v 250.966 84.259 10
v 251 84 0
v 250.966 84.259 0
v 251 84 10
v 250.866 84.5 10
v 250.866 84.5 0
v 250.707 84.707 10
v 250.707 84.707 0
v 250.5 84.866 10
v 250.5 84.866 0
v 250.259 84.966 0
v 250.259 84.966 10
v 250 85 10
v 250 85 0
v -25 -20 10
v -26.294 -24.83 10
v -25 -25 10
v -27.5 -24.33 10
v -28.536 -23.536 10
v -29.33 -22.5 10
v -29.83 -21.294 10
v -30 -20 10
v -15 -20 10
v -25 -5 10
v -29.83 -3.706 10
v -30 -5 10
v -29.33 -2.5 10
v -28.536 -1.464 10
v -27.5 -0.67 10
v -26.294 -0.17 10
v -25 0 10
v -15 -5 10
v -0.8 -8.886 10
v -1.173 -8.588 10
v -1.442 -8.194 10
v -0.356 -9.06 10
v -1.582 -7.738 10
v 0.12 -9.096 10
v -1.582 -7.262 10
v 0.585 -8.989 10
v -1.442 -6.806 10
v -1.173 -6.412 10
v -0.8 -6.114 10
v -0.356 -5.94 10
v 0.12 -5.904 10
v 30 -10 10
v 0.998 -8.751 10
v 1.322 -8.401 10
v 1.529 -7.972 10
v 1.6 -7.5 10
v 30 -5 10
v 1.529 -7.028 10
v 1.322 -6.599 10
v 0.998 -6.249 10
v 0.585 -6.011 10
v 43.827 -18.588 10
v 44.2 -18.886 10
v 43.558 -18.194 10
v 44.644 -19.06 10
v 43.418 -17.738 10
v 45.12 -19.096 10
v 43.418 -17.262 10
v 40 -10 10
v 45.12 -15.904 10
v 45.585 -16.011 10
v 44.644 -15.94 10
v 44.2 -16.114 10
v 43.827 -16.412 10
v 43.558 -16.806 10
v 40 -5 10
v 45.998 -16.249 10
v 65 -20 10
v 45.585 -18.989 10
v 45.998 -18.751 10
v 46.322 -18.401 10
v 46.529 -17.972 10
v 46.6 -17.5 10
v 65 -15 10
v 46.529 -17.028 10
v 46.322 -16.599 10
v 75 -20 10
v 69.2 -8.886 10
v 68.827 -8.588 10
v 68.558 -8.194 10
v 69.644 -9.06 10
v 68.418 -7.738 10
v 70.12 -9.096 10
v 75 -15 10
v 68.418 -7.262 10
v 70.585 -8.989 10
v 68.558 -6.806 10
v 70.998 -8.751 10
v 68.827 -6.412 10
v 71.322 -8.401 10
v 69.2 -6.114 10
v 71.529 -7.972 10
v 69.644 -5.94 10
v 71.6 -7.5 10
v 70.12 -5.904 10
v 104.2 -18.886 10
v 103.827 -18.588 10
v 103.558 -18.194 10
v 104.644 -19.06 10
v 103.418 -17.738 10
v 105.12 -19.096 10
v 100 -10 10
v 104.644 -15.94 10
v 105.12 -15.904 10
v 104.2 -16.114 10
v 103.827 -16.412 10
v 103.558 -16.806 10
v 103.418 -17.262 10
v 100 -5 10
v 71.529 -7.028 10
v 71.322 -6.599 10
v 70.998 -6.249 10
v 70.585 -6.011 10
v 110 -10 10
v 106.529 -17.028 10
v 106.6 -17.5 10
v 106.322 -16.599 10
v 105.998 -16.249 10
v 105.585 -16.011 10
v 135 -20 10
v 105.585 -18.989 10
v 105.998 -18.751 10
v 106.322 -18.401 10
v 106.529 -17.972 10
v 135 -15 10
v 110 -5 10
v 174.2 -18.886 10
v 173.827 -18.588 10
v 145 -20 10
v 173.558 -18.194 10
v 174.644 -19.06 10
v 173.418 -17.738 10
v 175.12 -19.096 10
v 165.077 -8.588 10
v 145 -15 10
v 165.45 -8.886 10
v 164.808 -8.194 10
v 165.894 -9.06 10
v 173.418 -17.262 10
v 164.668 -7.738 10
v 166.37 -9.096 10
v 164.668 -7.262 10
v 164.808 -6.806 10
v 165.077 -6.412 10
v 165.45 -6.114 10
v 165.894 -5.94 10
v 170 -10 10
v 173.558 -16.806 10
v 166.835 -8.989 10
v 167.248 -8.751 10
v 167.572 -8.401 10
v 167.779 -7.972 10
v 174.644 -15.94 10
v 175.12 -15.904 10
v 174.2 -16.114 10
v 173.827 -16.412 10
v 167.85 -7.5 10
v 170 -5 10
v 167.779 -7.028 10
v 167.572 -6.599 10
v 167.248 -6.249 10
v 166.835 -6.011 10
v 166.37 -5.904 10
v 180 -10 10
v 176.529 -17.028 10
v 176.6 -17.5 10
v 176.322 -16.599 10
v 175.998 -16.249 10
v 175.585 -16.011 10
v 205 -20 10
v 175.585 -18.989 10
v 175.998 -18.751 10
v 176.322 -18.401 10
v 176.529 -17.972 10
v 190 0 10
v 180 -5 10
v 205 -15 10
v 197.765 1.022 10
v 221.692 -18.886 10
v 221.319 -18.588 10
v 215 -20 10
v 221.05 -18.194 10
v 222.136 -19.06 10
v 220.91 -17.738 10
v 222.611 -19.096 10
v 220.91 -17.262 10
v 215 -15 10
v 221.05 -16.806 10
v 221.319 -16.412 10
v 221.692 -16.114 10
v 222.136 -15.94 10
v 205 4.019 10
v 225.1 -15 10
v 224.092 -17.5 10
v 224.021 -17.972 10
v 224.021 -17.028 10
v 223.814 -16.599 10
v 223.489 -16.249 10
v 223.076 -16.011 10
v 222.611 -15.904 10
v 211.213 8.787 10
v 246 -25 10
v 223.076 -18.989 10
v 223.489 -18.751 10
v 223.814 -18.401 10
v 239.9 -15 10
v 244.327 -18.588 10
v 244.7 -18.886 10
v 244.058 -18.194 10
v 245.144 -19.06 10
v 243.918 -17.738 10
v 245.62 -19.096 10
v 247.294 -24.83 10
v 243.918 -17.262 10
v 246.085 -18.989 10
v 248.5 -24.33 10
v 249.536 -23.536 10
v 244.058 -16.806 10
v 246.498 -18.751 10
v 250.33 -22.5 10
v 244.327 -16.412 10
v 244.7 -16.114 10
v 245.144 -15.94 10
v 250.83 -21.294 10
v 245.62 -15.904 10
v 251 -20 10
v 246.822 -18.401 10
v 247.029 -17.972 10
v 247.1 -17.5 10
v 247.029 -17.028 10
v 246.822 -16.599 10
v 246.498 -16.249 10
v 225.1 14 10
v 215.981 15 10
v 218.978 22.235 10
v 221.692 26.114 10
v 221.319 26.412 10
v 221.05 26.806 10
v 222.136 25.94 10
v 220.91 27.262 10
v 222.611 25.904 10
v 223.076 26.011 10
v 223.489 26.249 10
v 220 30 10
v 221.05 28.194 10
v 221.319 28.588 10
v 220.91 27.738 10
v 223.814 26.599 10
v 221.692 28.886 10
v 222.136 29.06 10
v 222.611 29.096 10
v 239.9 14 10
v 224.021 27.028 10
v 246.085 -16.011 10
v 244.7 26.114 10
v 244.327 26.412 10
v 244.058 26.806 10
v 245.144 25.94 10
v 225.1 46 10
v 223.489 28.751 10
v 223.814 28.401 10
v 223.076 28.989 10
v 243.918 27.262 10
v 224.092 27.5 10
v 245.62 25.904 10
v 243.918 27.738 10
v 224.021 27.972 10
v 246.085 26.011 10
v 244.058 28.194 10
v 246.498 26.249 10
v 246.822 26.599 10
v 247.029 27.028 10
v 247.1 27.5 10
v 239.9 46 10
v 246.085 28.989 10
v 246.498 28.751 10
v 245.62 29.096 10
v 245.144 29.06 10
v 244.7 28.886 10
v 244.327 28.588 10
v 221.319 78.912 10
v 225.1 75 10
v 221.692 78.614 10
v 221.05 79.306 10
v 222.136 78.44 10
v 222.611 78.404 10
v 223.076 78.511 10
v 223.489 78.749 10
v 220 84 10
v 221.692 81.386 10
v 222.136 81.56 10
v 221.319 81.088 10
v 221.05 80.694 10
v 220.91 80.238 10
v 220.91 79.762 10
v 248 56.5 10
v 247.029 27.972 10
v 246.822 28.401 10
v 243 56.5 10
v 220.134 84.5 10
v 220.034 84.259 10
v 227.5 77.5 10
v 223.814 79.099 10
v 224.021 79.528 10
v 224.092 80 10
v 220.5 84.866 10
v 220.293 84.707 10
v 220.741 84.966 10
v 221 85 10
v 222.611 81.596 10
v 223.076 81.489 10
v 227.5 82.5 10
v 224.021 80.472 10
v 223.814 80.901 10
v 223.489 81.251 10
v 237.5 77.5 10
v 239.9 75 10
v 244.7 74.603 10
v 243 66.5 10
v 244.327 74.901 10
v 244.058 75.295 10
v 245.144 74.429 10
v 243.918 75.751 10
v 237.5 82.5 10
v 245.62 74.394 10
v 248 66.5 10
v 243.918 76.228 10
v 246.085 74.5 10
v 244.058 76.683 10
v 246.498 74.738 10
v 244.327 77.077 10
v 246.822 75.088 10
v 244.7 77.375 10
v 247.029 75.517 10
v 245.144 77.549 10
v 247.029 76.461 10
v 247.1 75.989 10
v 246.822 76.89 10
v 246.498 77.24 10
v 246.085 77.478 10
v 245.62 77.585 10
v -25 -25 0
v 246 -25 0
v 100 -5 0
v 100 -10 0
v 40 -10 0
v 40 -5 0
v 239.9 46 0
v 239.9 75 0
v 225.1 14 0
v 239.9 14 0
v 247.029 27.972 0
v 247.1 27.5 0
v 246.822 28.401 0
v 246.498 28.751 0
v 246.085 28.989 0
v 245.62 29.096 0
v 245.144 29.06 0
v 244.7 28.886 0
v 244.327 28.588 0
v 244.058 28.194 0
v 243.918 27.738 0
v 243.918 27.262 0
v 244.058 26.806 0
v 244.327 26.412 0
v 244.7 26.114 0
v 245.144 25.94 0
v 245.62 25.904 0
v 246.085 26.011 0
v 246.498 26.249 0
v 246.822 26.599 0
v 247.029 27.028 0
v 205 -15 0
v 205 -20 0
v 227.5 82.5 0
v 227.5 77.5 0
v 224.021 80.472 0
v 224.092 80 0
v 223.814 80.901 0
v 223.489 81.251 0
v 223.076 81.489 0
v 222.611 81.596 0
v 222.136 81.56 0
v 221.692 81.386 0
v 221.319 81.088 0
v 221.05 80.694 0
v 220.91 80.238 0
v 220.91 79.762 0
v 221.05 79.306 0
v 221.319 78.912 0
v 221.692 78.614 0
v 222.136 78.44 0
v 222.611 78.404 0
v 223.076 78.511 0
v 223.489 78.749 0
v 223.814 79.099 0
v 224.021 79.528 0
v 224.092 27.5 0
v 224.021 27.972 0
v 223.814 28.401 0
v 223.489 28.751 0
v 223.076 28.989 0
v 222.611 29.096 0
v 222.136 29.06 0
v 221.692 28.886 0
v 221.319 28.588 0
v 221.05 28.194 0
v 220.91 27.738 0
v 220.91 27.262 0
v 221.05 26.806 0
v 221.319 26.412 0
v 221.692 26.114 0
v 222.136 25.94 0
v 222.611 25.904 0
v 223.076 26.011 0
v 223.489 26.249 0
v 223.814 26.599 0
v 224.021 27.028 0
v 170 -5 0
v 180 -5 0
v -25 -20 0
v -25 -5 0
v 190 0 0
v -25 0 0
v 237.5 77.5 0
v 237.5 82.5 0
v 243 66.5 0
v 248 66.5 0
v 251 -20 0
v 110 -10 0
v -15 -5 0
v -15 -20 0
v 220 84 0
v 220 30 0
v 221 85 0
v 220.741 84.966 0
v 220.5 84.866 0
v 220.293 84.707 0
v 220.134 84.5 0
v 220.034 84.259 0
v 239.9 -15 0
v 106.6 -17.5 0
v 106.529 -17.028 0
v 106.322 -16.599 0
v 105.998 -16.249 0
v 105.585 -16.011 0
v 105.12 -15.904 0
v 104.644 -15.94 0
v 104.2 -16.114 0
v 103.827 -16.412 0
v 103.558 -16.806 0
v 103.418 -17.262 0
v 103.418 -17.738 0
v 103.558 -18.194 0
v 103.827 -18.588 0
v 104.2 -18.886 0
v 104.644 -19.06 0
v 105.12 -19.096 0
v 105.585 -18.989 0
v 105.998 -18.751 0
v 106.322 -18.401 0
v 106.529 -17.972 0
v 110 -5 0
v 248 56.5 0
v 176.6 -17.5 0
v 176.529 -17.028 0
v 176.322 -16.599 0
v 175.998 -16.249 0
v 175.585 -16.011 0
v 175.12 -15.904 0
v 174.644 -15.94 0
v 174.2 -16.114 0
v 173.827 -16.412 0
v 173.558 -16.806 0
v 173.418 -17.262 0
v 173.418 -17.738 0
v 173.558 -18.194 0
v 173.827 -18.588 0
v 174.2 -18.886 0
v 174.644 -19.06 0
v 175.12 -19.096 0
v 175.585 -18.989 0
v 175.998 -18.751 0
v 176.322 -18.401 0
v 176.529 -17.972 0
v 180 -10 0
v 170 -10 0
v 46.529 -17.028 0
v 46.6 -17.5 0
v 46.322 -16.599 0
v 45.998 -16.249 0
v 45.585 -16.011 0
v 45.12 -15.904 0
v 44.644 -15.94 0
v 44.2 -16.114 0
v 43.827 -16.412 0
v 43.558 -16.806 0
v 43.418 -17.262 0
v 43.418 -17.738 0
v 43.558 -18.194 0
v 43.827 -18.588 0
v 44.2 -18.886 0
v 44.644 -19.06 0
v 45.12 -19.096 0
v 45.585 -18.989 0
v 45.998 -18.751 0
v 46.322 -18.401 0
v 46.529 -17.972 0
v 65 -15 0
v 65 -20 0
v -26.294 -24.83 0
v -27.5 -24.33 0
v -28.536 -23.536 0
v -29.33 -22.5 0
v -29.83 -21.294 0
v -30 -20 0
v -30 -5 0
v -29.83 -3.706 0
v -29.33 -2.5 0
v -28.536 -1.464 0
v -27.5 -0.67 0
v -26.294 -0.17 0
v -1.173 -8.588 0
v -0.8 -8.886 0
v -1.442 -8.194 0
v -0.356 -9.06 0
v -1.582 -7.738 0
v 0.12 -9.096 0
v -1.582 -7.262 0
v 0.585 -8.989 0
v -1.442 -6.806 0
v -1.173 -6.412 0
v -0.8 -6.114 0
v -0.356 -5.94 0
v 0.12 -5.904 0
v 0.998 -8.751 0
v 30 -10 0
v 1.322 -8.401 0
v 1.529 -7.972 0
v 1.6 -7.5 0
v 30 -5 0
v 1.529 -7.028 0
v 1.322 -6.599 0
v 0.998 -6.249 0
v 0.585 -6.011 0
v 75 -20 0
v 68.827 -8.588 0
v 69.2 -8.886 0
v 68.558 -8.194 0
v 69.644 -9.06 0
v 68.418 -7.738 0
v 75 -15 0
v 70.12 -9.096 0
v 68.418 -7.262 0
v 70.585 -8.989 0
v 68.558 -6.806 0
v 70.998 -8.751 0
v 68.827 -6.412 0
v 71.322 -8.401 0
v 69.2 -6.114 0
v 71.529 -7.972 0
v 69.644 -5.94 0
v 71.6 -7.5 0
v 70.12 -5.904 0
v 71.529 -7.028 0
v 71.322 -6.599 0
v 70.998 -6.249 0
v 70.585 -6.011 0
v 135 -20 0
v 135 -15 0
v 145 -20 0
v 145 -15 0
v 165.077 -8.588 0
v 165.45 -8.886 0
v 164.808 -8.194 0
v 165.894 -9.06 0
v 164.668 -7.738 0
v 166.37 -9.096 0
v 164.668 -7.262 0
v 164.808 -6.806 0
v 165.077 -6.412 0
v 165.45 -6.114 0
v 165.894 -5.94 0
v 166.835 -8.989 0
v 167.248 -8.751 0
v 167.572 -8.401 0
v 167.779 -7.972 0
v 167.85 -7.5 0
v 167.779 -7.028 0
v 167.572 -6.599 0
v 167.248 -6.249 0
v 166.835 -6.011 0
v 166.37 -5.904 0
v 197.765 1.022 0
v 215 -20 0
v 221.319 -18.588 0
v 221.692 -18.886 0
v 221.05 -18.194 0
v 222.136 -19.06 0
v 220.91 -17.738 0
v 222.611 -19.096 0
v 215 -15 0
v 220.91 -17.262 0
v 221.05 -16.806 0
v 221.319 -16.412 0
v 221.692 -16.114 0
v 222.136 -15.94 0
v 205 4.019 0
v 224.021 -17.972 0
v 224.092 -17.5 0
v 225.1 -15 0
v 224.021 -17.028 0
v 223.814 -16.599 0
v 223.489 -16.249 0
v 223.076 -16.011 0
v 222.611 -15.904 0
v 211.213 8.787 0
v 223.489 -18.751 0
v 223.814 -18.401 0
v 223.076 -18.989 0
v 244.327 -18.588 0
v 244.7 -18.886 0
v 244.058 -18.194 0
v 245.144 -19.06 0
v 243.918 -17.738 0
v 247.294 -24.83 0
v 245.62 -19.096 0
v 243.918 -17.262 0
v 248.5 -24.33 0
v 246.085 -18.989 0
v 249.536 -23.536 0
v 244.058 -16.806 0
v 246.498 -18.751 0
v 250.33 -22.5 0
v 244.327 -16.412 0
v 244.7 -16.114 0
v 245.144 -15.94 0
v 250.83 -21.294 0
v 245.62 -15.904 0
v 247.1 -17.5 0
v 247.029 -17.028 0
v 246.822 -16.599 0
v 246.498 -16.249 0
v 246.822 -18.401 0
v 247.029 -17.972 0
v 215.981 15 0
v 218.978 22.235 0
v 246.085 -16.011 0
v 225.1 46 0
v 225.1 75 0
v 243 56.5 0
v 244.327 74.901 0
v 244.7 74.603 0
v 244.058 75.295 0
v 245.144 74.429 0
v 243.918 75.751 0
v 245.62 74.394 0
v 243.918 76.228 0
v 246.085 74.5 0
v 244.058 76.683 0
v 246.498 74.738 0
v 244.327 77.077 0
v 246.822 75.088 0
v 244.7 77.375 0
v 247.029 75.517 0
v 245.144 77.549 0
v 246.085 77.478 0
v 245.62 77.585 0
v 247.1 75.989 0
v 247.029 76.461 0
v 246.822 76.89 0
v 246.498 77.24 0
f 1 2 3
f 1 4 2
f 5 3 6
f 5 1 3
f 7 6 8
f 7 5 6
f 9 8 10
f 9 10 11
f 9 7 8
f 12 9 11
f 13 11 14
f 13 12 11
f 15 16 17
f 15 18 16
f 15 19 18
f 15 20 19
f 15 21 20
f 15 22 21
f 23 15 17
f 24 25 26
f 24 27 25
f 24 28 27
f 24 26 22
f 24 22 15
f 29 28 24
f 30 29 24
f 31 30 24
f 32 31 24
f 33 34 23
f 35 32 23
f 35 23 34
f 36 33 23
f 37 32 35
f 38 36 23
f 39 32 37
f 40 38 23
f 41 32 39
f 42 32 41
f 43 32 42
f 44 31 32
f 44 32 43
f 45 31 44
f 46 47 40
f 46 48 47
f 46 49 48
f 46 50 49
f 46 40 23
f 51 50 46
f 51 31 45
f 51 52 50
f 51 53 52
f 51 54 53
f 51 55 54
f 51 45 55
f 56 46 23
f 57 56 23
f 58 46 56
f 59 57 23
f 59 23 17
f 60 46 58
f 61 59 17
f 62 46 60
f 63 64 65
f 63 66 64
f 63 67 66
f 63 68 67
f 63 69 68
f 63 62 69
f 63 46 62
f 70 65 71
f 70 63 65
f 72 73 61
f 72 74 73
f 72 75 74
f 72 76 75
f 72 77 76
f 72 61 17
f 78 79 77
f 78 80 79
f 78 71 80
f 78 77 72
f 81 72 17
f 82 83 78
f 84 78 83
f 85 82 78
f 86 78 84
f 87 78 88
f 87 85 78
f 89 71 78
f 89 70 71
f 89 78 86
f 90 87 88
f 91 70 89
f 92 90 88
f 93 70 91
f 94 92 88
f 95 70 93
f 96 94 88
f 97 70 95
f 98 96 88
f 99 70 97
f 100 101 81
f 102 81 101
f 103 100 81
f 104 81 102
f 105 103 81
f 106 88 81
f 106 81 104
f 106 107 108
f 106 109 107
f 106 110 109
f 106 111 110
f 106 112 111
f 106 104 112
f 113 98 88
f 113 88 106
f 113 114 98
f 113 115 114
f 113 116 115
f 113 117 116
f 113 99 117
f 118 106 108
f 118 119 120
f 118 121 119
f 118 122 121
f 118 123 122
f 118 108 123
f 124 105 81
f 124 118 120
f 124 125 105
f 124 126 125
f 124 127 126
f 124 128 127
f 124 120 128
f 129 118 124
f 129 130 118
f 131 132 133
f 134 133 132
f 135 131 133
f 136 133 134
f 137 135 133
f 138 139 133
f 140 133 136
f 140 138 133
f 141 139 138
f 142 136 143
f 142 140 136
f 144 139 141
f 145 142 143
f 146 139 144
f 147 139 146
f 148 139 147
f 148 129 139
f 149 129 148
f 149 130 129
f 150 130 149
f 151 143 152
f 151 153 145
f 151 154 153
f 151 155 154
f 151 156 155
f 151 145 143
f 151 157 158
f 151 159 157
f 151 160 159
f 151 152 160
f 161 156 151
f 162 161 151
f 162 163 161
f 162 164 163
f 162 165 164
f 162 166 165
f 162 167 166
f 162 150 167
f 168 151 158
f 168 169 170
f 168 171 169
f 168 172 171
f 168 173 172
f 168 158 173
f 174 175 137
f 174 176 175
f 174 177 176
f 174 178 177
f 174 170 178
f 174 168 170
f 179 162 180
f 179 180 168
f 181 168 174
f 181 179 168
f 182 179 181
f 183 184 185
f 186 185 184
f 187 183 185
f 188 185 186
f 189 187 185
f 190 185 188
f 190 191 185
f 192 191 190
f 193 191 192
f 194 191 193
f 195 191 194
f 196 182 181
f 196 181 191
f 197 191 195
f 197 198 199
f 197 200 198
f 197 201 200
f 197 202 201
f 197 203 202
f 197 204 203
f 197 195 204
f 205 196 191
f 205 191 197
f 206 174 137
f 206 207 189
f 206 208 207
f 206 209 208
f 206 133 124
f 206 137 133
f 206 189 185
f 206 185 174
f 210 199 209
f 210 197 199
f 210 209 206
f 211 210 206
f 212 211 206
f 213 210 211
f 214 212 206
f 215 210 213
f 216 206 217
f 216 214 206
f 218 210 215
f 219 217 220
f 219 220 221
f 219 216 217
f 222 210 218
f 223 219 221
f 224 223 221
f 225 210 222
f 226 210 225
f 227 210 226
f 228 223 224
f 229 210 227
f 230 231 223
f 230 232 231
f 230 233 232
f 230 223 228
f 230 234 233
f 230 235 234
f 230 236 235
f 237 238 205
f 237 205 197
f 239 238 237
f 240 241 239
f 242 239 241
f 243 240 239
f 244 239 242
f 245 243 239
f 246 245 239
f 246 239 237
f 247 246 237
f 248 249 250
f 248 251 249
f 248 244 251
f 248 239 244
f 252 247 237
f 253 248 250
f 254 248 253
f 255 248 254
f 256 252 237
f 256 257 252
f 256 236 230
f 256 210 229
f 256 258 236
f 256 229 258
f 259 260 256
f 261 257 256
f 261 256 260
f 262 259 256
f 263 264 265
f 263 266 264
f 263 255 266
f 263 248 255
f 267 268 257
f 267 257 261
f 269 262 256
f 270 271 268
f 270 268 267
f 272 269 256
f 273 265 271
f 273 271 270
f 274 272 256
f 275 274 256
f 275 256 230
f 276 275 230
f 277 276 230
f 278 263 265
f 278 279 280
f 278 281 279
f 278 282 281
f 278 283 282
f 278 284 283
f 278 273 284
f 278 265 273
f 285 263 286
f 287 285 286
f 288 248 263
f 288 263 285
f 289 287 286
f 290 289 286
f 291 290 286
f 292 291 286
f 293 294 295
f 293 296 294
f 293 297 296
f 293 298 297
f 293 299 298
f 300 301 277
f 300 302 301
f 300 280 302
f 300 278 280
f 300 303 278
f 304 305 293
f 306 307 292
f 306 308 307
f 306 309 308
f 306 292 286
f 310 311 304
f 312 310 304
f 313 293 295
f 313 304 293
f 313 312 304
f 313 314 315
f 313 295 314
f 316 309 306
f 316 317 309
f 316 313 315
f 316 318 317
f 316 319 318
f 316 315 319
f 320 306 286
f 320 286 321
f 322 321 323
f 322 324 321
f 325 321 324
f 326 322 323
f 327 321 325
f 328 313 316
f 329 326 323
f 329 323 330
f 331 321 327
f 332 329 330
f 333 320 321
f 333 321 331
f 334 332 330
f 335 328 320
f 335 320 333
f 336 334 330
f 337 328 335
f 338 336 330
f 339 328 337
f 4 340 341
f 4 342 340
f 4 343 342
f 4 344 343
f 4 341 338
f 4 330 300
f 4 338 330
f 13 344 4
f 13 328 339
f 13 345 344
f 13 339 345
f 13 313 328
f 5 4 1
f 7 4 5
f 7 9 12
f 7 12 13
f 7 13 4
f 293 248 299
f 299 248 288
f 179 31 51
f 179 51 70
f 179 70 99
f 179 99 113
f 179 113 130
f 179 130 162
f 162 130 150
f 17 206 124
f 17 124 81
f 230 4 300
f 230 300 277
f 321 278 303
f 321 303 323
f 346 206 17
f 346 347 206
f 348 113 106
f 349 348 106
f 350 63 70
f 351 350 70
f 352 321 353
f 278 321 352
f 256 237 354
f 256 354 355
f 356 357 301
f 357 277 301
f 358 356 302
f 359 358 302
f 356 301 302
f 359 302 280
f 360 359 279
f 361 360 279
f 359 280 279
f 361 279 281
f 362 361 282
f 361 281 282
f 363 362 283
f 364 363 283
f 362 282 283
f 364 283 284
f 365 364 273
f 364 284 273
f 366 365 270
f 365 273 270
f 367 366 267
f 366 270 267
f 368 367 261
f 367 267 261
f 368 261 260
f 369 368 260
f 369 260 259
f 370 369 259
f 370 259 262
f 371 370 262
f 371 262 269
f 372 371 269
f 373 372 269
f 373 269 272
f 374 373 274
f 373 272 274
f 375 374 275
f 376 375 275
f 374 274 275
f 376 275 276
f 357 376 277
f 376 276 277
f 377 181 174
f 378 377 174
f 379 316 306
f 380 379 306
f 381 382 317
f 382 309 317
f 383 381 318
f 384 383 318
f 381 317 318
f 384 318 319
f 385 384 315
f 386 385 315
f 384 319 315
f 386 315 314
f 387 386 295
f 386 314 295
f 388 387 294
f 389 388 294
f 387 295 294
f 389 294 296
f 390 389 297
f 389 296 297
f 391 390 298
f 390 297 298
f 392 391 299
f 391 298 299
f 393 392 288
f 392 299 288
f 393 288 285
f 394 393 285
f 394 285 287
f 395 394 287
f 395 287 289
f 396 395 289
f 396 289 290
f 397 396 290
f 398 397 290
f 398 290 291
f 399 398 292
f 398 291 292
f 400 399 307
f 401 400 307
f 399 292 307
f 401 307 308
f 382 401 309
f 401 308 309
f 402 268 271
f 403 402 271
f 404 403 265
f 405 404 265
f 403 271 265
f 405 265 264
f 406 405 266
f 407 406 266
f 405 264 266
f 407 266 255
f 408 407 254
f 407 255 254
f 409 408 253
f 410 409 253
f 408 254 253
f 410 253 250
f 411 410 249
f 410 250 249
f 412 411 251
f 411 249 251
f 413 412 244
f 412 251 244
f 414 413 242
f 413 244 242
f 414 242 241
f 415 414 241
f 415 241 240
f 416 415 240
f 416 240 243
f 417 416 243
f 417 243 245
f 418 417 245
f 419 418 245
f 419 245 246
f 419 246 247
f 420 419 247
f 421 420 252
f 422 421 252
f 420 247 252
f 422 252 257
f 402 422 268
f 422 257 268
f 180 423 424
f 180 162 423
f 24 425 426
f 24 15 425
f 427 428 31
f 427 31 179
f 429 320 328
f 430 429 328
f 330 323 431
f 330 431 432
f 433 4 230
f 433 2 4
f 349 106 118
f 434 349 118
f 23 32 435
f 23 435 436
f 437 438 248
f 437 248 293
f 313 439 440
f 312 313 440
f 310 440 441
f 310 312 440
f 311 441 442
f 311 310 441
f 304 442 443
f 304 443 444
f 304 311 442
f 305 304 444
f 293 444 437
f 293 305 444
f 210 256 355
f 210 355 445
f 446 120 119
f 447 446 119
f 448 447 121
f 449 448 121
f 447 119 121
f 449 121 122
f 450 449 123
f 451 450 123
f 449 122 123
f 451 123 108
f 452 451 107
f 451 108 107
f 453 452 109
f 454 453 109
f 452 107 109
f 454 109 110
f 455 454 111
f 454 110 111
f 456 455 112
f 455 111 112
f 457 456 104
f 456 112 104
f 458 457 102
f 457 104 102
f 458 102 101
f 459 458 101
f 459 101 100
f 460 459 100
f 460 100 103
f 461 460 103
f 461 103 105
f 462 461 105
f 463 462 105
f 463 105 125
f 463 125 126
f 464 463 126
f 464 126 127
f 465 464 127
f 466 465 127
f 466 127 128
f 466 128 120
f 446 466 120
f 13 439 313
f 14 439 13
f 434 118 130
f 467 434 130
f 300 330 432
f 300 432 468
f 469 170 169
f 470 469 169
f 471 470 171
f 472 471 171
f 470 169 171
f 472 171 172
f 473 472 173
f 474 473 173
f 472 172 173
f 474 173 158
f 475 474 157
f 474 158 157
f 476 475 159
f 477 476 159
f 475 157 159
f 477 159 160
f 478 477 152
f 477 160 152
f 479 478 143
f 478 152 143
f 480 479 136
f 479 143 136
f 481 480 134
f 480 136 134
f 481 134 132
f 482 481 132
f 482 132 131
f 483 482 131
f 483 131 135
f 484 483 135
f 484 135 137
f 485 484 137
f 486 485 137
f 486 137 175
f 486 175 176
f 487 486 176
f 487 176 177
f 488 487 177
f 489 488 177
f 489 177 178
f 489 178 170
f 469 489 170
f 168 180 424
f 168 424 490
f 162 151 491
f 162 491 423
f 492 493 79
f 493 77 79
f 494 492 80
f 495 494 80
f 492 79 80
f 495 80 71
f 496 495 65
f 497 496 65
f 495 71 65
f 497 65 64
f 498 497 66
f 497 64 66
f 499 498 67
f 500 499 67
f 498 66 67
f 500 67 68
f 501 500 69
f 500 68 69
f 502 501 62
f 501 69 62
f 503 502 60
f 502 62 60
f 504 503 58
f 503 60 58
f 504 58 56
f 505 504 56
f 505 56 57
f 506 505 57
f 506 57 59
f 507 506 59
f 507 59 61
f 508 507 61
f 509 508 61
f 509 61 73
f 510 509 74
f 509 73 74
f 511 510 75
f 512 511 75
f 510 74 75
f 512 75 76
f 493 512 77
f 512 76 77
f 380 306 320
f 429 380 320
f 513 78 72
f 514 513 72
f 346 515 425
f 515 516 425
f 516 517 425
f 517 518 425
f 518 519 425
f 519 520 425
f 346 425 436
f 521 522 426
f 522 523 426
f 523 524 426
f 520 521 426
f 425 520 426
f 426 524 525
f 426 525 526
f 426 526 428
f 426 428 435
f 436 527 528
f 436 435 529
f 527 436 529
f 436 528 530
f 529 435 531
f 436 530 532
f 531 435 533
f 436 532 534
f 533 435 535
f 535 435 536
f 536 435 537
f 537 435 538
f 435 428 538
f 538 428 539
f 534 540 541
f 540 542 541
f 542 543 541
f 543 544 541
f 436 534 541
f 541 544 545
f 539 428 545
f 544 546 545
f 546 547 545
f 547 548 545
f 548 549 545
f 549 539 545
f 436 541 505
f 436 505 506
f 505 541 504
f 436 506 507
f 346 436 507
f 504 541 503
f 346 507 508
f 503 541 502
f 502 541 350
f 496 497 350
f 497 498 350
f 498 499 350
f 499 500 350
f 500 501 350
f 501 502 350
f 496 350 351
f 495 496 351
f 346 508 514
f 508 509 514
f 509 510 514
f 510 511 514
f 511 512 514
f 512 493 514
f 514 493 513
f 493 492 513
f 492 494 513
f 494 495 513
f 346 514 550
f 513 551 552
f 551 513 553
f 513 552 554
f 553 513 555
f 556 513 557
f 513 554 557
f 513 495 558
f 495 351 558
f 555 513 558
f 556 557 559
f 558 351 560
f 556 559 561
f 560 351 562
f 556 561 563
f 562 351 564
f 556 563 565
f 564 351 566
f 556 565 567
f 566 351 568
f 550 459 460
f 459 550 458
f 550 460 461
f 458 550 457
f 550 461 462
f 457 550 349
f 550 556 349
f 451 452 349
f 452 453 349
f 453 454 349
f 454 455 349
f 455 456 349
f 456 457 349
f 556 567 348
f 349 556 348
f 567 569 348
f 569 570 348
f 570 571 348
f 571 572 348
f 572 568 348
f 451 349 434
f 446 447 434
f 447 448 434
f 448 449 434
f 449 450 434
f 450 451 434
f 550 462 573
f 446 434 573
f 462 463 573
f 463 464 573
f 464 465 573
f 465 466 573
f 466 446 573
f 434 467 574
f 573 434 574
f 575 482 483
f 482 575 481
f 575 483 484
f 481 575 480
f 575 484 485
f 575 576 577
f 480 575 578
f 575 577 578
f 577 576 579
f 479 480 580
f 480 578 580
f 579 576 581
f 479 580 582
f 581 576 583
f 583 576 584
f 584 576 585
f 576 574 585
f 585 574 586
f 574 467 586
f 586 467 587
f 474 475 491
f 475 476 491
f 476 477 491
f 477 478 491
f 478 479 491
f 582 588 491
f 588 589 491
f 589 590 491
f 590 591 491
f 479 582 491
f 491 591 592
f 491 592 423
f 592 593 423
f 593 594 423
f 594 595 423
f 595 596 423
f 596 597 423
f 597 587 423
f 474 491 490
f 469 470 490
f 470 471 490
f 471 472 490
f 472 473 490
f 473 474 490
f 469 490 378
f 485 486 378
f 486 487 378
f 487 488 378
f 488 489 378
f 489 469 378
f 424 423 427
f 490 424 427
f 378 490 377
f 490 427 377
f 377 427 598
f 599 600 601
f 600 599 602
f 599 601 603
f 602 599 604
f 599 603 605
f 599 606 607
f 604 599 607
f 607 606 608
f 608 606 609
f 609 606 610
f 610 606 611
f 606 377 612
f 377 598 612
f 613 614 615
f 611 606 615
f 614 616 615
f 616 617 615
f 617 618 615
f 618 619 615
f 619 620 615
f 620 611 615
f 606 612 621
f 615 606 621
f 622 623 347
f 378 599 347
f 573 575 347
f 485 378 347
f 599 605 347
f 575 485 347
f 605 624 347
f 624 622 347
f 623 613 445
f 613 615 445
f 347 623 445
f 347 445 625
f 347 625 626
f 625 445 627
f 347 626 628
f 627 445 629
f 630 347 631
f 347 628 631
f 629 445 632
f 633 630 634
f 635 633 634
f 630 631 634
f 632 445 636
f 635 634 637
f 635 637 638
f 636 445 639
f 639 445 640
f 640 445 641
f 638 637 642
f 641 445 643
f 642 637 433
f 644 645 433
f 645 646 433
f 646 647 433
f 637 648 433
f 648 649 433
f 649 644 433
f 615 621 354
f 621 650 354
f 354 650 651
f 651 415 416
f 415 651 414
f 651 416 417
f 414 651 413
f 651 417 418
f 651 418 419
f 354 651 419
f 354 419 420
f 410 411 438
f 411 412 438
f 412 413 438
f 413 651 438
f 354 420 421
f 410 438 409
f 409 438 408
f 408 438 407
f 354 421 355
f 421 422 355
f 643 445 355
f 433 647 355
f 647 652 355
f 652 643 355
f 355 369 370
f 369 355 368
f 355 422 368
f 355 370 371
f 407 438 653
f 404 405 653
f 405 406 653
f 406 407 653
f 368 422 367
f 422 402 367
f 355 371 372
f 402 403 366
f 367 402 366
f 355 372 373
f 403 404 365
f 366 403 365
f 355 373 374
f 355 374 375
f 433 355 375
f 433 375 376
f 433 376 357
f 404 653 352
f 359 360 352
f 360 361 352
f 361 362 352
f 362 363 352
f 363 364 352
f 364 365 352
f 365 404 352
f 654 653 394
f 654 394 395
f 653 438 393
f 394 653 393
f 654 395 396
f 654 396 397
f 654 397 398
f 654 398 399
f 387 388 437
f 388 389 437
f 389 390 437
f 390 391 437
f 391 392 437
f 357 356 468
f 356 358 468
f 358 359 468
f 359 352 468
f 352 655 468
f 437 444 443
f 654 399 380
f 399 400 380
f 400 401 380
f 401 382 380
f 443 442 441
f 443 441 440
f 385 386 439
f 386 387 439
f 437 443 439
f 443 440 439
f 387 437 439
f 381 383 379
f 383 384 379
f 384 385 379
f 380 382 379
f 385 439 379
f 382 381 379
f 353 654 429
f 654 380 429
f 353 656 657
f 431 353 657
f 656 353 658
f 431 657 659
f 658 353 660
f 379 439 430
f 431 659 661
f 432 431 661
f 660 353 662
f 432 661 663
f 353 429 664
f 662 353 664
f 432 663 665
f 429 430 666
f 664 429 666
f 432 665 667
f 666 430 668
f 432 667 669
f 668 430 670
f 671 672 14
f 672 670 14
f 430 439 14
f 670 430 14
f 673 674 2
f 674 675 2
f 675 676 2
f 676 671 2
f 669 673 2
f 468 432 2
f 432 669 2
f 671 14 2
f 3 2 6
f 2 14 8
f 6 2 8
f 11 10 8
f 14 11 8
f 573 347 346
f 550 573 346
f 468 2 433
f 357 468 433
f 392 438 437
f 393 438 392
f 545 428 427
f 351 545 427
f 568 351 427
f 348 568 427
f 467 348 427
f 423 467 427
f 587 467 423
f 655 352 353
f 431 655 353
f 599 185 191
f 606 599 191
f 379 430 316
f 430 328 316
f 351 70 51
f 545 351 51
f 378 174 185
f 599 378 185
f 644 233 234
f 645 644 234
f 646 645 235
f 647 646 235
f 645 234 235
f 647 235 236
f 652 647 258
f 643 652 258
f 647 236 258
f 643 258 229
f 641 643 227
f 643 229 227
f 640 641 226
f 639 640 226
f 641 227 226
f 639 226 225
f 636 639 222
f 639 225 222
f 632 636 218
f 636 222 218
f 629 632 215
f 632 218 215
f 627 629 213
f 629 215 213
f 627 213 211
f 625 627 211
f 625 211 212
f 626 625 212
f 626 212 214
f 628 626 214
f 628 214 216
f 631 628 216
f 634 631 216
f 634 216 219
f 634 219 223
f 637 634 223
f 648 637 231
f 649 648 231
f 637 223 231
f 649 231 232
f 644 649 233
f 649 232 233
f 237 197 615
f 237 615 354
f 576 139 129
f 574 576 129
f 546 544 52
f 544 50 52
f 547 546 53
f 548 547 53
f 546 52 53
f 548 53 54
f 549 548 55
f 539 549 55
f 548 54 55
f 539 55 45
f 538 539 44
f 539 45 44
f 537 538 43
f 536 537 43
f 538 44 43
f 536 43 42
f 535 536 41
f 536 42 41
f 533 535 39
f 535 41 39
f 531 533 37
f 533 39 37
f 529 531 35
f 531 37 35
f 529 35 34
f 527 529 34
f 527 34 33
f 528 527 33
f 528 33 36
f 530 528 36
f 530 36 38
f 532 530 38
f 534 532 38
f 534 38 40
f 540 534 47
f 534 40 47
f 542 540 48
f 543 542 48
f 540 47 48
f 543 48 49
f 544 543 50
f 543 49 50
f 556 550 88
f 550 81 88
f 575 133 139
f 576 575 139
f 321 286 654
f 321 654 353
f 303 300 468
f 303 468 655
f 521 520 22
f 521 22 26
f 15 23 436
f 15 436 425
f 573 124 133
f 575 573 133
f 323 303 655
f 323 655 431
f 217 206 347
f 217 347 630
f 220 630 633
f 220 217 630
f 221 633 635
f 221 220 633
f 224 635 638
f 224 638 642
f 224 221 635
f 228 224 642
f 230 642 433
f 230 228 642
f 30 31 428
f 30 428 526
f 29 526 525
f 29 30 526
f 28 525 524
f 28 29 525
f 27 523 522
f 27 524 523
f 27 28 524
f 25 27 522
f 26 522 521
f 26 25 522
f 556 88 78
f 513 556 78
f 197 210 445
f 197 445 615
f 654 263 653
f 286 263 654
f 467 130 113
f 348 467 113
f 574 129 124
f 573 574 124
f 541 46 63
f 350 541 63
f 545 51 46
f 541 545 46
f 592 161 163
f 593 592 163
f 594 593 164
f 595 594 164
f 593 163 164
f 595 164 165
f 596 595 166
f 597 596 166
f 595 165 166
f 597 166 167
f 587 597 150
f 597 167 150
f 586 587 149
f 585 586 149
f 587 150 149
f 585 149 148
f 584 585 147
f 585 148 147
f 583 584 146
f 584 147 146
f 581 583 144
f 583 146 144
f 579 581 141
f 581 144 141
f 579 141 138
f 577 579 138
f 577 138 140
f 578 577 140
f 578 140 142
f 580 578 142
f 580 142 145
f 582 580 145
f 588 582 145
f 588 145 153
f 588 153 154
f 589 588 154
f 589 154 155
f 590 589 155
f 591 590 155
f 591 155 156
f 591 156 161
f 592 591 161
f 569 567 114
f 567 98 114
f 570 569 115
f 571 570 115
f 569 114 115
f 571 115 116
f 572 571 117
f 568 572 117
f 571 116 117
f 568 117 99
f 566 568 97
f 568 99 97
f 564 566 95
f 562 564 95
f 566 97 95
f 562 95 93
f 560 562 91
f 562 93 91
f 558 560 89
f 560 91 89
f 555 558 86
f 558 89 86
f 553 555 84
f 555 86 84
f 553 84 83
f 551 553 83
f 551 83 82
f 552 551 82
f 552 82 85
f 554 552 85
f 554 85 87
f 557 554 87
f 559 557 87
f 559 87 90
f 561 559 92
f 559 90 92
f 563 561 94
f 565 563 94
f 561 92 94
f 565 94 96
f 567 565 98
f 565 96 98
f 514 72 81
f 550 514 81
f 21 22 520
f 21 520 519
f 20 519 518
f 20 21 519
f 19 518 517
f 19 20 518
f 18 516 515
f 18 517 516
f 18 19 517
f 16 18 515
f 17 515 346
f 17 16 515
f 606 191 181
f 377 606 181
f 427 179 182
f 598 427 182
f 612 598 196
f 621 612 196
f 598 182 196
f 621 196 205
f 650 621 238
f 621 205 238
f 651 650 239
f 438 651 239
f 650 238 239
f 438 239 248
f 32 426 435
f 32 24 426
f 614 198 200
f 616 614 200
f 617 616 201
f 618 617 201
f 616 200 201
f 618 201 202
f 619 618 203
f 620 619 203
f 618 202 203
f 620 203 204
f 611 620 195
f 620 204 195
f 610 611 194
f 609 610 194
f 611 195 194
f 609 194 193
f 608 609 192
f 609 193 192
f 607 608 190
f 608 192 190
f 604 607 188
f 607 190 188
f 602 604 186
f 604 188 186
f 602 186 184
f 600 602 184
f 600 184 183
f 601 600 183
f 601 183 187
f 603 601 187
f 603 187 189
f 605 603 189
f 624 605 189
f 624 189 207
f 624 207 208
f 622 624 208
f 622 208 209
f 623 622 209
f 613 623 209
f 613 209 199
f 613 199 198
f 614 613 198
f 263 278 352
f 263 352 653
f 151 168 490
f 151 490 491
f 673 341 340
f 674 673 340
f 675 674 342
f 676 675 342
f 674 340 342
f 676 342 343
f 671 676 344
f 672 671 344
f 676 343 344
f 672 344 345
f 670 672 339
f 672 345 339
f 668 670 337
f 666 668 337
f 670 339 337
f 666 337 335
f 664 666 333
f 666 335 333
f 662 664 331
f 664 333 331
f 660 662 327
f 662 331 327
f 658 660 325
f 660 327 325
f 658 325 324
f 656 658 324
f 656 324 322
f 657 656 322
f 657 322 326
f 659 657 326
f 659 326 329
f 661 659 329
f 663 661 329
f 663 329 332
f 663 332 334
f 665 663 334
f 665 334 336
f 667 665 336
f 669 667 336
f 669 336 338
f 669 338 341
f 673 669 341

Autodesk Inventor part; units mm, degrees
ref_plane "YZ Plane" through (0, 0, 0) normal (1, 0, 0) x (0, 1, 0)
ref_plane "XZ Plane" through (0, 0, 0) normal (0, 1, 0) x (-1, 0, 0)
ref_plane "XY Plane" through (0, 0, 0) normal (0, 0, 1) x (1, 0, 0)
sketch "Boceto1" plane through (0, 0, 0) normal (0, 0, 1) x (1, 0, 0)
  line L0 (0, 0) -> (220, 0)
  line L1 (251, 0) -> (251, -25)
  line L2 (251, -25) -> (0, -25)
  line L3 (220, 0) -> (220, 85)
  line L4 (220, 85) -> (251, 85)
  line L5 (251, 85) -> (251, 0)
  line L6 (0, -25) -> (-30, -25)
  line L7 (-30, -25) -> (-30, 0)
  line L8 (-30, 0) -> (0, 0)
  dimension "d3" = 85
  dimension "d4" = 31
extrude "Extrusión1" add sketch "Boceto1" along normal blind 10
fillet "Empalme1" radius 30 1 edges at (220, 0, 5)
sketch "Boceto2" plane through (0, 0, 10) normal (0, 0, 1) x (1, 0, 0)
  line L0 (220, 30) -> (220, 85) projected
  line L1 (251, -25) -> (-30, -25) projected
  line L2 (220, 85) -> (251, 85) projected
  line L3 (225.1, 75) -> (239.9, 75)
  line L4 (239.9, 75) -> (239.9, 46)
  line L5 (239.9, 46) -> (225.1, 46)
  line L6 (225.1, 46) -> (225.1, 75)
  line L7 (225.1, 14) -> (239.9, 14)
  line L8 (239.9, 14) -> (239.9, -15)
  line L9 (239.9, -15) -> (225.1, -15)
  line L10 (225.1, -15) -> (225.1, 14)
  point P0 (225, 80)
  point P1 (220, 75)
  point P2 (5, -25)
  point P3 (240, -25)
  point P4 (245, -20)
  point P5 (245, 75)
  point P6 (240, 80)
  point P7 (0, 0)
  point P8 (0, -25)
  dimension "d10" = 14.8
  dimension "d11" = 14.8
  dimension "d12" = 5.1
  dimension "d14" = 10
  dimension "d15" = 29
  dimension "d16" = 29
  dimension "d17" = 10
  dimension "d82" = 5.1
extrude "Extrusión2" cut sketch "Boceto2" against normal blind 10
sketch "Boceto3" plane through (0, 0, 10) normal (0, 0, 1) x (1, 0, 0)
  line L0 (0, 0) -> (190, 0) projected
  line L1 (251, -25) -> (-30, -25) projected
  line L2 (180, -10) -> (170, -10)
  line L3 (170, -10) -> (170, -5)
  line L4 (170, -5) -> (180, -5)
  line L5 (180, -5) -> (180, -10)
  line L6 (110, -5) -> (100, -5)
  line L7 (100, -5) -> (100, -10)
  line L8 (100, -10) -> (110, -10)
  line L9 (110, -10) -> (110, -5)
  line L10 (40, -5) -> (30, -5)
  line L11 (30, -5) -> (30, -10)
  line L12 (30, -10) -> (40, -10)
  line L13 (40, -10) -> (40, -5)
  line L14 (145, -15) -> (135, -15)
  line L15 (135, -15) -> (135, -20)
  line L16 (135, -20) -> (145, -20)
  line L17 (145, -20) -> (145, -15)
  line L18 (75, -15) -> (65, -15)
  line L19 (65, -15) -> (65, -20)
  line L20 (65, -20) -> (75, -20)
  line L21 (75, -20) -> (75, -15)
  point P0 (5, 0)
  point P1 (0, -5)
  point P2 (0, -20)
  point P3 (5, -25)
  point P4 (240, -25)
  dimension "d20" = 10
  dimension "d21" = 10
  dimension "d22" = 10
  dimension "d24" = 5
  dimension "d25" = 5
  dimension "d26" = 5
  dimension "d27" = 5
  dimension "d28" = 5
  dimension "d29" = 10
  dimension "d30" = 10
  dimension "d31" = 5
  dimension "d32" = 5
  dimension "d33" = 5
  dimension "d34" = 5
  dimension "d36" = 25
  dimension "d37" = 25
  dimension "d38" = 25
  dimension "d39" = 25
extrude "Extrusión3" cut sketch "Boceto3" against normal blind 10
sketch "Boceto4" plane through (0, 0, 10) normal (0, 0, 1) x (1, 0, 0)
  line L0 (145, -15) -> (145, -20) projected
  line L1 (145, -20) -> (135, -20) projected
  line L2 (205, -20) -> (215, -20)
  line L3 (215, -20) -> (215, -15)
  line L4 (215, -15) -> (205, -15)
  line L5 (205, -15) -> (205, -20)
  point P0 (0, 0)
  dimension "d42" = 10
  dimension "d43" = 5
  dimension "d44" = 60
extrude "Extrusión4" cut sketch "Boceto4" against normal blind 10
sketch "Boceto6" plane through (0, 0, 10) normal (0, 0, 1) x (1, 0, 0)
  line L0 (237.5, 82.5) -> (227.5, 82.5)
  line L1 (227.5, 82.5) -> (227.5, 77.5)
  line L2 (227.5, 77.5) -> (237.5, 77.5)
  line L3 (237.5, 77.5) -> (237.5, 82.5)
  circle A0 centre (245.5, -17.5) radius 1.6
  circle A1 centre (245.5, 27.5) radius 1.6
  circle A2 centre (245.5, 75.9891) radius 1.6
  circle A3 centre (222.4918, 80) radius 1.6
  circle A4 centre (222.4918, 27.5) radius 1.6
  circle A5 centre (175, -17.5) radius 1.6
  circle A6 centre (166.25, -7.5) radius 1.6
  circle A7 centre (105, -17.5) radius 1.6
  circle A8 centre (70, -7.5) radius 1.6
  circle A9 centre (45, -17.5) radius 1.6
  circle A10 centre (0, -7.5) radius 1.6
  line L4 (-30, -25) -> (-30, 0) projected
  circle A11 centre (222.4918, -17.5) radius 1.6
  line L5 (251, 85) -> (251, -25) projected
  line L6 (220, 85) -> (251, 85) projected
  line L7 (170, -10) -> (170, -5) projected
  point P0 (0, 0)
  dimension "d52" = 5
  dimension "d54" = 3.2
  dimension "d55" = 3.2
  dimension "d56" = 3.2
  dimension "d57" = 3.2
  dimension "d58" = 3.2
  dimension "d60" = 3.2
  dimension "d61" = 3.2
  dimension "d62" = 3.2
  dimension "d63" = 3.2
  dimension "d64" = 3.2
  dimension "d65" = 3.2
  dimension "d80" = 30
  dimension "d81" = 3.2
  dimension "d83" = 5.5
  dimension "d84" = 5.5
  dimension "d85" = 5.5
  dimension "d92" = 2.5
  dimension "d93" = 5
  dimension "d94" = 3.75
  dimension "d95" = 75
extrude "Extrusión6" cut sketch "Boceto6" against normal blind 10
fillet "Empalme3" radius 5 1 edges at (251, -25, 5)
fillet "Empalme4" radius 5 2 edges at (-30, 0, 5) (-30, -25, 5)
fillet "Empalme5" radius 1 2 edges at (220, 85, 5) (251, 85, 5)
sketch "Boceto7" plane through (0, 0, 10) normal (0, 0, 1) x (1, 0, 0)
  line L0 (-25, 0) -> (190, 0) projected
  line L1 (-30, -20) -> (-30, -5) projected
  line L2 (-25, -5) -> (-15, -5)
  line L3 (-15, -5) -> (-15, -20)
  line L4 (-15, -20) -> (-25, -20)
  line L5 (-25, -20) -> (-25, -5)
  point P0 (0, 0)
  dimension "d74" = 10
  dimension "d75" = 15
  dimension "d76" = 5
  dimension "d77" = 5
extrude "Extrusión7" cut sketch "Boceto7" against normal blind 10
sketch "Boceto8" plane through (0, 0, 10) normal (0, 0, 1) x (1, 0, 0)
  line L0 (221, 85) -> (250, 85) projected
  line L1 (251, 84) -> (251, -20) projected
  line L2 (243, 66.5) -> (248, 66.5)
  line L3 (248, 66.5) -> (248, 56.5)
  line L4 (248, 56.5) -> (243, 56.5)
  line L5 (243, 56.5) -> (243, 66.5)
  point P0 (0, 0)
  dimension "d86" = 5
  dimension "d87" = 10
  dimension "d88" = 3
  dimension "d89" = 18.5
extrude "Extrusión8" cut sketch "Boceto8" against normal blind 10
properties part number "brazo eje z"
